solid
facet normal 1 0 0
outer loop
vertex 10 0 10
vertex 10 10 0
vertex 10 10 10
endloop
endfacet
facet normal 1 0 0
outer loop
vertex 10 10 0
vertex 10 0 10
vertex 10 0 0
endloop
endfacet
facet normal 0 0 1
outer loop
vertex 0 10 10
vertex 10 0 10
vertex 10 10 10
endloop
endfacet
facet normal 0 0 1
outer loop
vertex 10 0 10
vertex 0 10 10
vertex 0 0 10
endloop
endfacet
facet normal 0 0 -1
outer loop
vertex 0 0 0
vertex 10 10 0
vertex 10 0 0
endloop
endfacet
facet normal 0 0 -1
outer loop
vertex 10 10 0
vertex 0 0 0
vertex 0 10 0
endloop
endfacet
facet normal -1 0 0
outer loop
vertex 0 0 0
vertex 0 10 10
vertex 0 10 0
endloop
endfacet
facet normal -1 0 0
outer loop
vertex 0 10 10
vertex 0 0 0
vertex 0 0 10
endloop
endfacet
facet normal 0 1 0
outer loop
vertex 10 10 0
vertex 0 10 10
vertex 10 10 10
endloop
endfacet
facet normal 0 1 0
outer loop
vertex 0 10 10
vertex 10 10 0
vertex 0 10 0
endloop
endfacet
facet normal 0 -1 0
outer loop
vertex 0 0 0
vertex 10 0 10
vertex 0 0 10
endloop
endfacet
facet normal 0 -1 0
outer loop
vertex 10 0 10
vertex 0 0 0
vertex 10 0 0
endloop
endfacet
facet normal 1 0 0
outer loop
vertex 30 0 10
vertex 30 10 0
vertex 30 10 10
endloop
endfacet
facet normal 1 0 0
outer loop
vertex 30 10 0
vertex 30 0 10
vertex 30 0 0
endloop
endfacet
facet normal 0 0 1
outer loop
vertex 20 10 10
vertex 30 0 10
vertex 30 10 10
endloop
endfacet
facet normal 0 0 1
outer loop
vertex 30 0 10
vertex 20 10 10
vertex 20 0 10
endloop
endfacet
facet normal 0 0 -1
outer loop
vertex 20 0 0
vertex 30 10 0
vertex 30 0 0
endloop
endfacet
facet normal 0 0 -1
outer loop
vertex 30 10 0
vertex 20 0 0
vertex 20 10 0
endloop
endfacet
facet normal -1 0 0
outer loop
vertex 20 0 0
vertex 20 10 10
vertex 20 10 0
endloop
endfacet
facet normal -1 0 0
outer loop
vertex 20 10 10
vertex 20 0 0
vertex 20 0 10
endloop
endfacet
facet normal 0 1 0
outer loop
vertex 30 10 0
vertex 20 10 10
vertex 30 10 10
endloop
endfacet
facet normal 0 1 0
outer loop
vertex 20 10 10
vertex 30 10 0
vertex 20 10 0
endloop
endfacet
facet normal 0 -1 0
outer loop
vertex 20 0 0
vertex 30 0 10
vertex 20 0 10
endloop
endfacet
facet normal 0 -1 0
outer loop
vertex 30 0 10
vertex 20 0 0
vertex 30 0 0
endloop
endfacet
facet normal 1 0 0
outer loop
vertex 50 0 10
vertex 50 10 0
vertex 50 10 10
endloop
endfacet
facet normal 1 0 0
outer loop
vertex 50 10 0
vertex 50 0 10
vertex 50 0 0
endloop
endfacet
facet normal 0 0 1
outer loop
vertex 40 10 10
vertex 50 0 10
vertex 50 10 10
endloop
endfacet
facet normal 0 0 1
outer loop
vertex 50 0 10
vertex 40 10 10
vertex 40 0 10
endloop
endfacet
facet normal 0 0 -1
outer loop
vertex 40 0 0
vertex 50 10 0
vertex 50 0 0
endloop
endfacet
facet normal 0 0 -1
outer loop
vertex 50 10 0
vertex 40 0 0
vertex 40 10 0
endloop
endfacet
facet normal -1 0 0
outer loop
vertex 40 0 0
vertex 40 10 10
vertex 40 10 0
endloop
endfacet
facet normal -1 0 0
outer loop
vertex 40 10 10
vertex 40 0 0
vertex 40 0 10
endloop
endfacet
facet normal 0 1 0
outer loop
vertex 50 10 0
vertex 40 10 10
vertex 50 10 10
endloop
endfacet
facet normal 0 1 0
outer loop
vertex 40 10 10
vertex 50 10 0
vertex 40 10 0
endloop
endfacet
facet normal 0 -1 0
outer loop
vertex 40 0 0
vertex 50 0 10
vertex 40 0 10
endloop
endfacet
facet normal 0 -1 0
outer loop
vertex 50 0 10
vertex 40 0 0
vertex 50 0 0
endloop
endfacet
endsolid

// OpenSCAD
// SYMPTOM: a real union imported as ALL-NULL roots (jbarr routing_tiles, a
//   51-volume model, came back as 84 null Part::Feature roots). Before the
//   square fix (#15) it was a "Null input shape" CRASH instead.
// CAUSE: square([0,0]) imports as a null-shape operand (#15, so intersection
//   stays correct). That null then propagated through two consumers that were
//   never null-safe: linear_extrude (a null profile -> null Part::Extrusion)
//   and the >2-child Part::MultiFuse (recomputes to a null shape), nulling the
//   whole union.
// FIX: importCSG.py -> fuse() resolves lazy shapes, then DROPS and CONSUMES
//   null operands up front (A u 0 = A; replaces the single-fuse special case);
//   linear_extrude of a null/empty profile returns empty and consumes the
//   profile (extrude(0) = 0) so no stray null root lingers. Commit 024eff9443.
// EXPECTED (OpenSCAD): the empty extrude contributes nothing; the three disjoint
//   cubes survive -> volume 3*1000 = 3000, and NO null document roots.
union() {
	cube([10, 10, 10]);
	translate([20, 0, 0]) cube([10, 10, 10]);
	translate([40, 0, 0]) cube([10, 10, 10]);
	linear_extrude(height = 2) square([0, 0]);
}
